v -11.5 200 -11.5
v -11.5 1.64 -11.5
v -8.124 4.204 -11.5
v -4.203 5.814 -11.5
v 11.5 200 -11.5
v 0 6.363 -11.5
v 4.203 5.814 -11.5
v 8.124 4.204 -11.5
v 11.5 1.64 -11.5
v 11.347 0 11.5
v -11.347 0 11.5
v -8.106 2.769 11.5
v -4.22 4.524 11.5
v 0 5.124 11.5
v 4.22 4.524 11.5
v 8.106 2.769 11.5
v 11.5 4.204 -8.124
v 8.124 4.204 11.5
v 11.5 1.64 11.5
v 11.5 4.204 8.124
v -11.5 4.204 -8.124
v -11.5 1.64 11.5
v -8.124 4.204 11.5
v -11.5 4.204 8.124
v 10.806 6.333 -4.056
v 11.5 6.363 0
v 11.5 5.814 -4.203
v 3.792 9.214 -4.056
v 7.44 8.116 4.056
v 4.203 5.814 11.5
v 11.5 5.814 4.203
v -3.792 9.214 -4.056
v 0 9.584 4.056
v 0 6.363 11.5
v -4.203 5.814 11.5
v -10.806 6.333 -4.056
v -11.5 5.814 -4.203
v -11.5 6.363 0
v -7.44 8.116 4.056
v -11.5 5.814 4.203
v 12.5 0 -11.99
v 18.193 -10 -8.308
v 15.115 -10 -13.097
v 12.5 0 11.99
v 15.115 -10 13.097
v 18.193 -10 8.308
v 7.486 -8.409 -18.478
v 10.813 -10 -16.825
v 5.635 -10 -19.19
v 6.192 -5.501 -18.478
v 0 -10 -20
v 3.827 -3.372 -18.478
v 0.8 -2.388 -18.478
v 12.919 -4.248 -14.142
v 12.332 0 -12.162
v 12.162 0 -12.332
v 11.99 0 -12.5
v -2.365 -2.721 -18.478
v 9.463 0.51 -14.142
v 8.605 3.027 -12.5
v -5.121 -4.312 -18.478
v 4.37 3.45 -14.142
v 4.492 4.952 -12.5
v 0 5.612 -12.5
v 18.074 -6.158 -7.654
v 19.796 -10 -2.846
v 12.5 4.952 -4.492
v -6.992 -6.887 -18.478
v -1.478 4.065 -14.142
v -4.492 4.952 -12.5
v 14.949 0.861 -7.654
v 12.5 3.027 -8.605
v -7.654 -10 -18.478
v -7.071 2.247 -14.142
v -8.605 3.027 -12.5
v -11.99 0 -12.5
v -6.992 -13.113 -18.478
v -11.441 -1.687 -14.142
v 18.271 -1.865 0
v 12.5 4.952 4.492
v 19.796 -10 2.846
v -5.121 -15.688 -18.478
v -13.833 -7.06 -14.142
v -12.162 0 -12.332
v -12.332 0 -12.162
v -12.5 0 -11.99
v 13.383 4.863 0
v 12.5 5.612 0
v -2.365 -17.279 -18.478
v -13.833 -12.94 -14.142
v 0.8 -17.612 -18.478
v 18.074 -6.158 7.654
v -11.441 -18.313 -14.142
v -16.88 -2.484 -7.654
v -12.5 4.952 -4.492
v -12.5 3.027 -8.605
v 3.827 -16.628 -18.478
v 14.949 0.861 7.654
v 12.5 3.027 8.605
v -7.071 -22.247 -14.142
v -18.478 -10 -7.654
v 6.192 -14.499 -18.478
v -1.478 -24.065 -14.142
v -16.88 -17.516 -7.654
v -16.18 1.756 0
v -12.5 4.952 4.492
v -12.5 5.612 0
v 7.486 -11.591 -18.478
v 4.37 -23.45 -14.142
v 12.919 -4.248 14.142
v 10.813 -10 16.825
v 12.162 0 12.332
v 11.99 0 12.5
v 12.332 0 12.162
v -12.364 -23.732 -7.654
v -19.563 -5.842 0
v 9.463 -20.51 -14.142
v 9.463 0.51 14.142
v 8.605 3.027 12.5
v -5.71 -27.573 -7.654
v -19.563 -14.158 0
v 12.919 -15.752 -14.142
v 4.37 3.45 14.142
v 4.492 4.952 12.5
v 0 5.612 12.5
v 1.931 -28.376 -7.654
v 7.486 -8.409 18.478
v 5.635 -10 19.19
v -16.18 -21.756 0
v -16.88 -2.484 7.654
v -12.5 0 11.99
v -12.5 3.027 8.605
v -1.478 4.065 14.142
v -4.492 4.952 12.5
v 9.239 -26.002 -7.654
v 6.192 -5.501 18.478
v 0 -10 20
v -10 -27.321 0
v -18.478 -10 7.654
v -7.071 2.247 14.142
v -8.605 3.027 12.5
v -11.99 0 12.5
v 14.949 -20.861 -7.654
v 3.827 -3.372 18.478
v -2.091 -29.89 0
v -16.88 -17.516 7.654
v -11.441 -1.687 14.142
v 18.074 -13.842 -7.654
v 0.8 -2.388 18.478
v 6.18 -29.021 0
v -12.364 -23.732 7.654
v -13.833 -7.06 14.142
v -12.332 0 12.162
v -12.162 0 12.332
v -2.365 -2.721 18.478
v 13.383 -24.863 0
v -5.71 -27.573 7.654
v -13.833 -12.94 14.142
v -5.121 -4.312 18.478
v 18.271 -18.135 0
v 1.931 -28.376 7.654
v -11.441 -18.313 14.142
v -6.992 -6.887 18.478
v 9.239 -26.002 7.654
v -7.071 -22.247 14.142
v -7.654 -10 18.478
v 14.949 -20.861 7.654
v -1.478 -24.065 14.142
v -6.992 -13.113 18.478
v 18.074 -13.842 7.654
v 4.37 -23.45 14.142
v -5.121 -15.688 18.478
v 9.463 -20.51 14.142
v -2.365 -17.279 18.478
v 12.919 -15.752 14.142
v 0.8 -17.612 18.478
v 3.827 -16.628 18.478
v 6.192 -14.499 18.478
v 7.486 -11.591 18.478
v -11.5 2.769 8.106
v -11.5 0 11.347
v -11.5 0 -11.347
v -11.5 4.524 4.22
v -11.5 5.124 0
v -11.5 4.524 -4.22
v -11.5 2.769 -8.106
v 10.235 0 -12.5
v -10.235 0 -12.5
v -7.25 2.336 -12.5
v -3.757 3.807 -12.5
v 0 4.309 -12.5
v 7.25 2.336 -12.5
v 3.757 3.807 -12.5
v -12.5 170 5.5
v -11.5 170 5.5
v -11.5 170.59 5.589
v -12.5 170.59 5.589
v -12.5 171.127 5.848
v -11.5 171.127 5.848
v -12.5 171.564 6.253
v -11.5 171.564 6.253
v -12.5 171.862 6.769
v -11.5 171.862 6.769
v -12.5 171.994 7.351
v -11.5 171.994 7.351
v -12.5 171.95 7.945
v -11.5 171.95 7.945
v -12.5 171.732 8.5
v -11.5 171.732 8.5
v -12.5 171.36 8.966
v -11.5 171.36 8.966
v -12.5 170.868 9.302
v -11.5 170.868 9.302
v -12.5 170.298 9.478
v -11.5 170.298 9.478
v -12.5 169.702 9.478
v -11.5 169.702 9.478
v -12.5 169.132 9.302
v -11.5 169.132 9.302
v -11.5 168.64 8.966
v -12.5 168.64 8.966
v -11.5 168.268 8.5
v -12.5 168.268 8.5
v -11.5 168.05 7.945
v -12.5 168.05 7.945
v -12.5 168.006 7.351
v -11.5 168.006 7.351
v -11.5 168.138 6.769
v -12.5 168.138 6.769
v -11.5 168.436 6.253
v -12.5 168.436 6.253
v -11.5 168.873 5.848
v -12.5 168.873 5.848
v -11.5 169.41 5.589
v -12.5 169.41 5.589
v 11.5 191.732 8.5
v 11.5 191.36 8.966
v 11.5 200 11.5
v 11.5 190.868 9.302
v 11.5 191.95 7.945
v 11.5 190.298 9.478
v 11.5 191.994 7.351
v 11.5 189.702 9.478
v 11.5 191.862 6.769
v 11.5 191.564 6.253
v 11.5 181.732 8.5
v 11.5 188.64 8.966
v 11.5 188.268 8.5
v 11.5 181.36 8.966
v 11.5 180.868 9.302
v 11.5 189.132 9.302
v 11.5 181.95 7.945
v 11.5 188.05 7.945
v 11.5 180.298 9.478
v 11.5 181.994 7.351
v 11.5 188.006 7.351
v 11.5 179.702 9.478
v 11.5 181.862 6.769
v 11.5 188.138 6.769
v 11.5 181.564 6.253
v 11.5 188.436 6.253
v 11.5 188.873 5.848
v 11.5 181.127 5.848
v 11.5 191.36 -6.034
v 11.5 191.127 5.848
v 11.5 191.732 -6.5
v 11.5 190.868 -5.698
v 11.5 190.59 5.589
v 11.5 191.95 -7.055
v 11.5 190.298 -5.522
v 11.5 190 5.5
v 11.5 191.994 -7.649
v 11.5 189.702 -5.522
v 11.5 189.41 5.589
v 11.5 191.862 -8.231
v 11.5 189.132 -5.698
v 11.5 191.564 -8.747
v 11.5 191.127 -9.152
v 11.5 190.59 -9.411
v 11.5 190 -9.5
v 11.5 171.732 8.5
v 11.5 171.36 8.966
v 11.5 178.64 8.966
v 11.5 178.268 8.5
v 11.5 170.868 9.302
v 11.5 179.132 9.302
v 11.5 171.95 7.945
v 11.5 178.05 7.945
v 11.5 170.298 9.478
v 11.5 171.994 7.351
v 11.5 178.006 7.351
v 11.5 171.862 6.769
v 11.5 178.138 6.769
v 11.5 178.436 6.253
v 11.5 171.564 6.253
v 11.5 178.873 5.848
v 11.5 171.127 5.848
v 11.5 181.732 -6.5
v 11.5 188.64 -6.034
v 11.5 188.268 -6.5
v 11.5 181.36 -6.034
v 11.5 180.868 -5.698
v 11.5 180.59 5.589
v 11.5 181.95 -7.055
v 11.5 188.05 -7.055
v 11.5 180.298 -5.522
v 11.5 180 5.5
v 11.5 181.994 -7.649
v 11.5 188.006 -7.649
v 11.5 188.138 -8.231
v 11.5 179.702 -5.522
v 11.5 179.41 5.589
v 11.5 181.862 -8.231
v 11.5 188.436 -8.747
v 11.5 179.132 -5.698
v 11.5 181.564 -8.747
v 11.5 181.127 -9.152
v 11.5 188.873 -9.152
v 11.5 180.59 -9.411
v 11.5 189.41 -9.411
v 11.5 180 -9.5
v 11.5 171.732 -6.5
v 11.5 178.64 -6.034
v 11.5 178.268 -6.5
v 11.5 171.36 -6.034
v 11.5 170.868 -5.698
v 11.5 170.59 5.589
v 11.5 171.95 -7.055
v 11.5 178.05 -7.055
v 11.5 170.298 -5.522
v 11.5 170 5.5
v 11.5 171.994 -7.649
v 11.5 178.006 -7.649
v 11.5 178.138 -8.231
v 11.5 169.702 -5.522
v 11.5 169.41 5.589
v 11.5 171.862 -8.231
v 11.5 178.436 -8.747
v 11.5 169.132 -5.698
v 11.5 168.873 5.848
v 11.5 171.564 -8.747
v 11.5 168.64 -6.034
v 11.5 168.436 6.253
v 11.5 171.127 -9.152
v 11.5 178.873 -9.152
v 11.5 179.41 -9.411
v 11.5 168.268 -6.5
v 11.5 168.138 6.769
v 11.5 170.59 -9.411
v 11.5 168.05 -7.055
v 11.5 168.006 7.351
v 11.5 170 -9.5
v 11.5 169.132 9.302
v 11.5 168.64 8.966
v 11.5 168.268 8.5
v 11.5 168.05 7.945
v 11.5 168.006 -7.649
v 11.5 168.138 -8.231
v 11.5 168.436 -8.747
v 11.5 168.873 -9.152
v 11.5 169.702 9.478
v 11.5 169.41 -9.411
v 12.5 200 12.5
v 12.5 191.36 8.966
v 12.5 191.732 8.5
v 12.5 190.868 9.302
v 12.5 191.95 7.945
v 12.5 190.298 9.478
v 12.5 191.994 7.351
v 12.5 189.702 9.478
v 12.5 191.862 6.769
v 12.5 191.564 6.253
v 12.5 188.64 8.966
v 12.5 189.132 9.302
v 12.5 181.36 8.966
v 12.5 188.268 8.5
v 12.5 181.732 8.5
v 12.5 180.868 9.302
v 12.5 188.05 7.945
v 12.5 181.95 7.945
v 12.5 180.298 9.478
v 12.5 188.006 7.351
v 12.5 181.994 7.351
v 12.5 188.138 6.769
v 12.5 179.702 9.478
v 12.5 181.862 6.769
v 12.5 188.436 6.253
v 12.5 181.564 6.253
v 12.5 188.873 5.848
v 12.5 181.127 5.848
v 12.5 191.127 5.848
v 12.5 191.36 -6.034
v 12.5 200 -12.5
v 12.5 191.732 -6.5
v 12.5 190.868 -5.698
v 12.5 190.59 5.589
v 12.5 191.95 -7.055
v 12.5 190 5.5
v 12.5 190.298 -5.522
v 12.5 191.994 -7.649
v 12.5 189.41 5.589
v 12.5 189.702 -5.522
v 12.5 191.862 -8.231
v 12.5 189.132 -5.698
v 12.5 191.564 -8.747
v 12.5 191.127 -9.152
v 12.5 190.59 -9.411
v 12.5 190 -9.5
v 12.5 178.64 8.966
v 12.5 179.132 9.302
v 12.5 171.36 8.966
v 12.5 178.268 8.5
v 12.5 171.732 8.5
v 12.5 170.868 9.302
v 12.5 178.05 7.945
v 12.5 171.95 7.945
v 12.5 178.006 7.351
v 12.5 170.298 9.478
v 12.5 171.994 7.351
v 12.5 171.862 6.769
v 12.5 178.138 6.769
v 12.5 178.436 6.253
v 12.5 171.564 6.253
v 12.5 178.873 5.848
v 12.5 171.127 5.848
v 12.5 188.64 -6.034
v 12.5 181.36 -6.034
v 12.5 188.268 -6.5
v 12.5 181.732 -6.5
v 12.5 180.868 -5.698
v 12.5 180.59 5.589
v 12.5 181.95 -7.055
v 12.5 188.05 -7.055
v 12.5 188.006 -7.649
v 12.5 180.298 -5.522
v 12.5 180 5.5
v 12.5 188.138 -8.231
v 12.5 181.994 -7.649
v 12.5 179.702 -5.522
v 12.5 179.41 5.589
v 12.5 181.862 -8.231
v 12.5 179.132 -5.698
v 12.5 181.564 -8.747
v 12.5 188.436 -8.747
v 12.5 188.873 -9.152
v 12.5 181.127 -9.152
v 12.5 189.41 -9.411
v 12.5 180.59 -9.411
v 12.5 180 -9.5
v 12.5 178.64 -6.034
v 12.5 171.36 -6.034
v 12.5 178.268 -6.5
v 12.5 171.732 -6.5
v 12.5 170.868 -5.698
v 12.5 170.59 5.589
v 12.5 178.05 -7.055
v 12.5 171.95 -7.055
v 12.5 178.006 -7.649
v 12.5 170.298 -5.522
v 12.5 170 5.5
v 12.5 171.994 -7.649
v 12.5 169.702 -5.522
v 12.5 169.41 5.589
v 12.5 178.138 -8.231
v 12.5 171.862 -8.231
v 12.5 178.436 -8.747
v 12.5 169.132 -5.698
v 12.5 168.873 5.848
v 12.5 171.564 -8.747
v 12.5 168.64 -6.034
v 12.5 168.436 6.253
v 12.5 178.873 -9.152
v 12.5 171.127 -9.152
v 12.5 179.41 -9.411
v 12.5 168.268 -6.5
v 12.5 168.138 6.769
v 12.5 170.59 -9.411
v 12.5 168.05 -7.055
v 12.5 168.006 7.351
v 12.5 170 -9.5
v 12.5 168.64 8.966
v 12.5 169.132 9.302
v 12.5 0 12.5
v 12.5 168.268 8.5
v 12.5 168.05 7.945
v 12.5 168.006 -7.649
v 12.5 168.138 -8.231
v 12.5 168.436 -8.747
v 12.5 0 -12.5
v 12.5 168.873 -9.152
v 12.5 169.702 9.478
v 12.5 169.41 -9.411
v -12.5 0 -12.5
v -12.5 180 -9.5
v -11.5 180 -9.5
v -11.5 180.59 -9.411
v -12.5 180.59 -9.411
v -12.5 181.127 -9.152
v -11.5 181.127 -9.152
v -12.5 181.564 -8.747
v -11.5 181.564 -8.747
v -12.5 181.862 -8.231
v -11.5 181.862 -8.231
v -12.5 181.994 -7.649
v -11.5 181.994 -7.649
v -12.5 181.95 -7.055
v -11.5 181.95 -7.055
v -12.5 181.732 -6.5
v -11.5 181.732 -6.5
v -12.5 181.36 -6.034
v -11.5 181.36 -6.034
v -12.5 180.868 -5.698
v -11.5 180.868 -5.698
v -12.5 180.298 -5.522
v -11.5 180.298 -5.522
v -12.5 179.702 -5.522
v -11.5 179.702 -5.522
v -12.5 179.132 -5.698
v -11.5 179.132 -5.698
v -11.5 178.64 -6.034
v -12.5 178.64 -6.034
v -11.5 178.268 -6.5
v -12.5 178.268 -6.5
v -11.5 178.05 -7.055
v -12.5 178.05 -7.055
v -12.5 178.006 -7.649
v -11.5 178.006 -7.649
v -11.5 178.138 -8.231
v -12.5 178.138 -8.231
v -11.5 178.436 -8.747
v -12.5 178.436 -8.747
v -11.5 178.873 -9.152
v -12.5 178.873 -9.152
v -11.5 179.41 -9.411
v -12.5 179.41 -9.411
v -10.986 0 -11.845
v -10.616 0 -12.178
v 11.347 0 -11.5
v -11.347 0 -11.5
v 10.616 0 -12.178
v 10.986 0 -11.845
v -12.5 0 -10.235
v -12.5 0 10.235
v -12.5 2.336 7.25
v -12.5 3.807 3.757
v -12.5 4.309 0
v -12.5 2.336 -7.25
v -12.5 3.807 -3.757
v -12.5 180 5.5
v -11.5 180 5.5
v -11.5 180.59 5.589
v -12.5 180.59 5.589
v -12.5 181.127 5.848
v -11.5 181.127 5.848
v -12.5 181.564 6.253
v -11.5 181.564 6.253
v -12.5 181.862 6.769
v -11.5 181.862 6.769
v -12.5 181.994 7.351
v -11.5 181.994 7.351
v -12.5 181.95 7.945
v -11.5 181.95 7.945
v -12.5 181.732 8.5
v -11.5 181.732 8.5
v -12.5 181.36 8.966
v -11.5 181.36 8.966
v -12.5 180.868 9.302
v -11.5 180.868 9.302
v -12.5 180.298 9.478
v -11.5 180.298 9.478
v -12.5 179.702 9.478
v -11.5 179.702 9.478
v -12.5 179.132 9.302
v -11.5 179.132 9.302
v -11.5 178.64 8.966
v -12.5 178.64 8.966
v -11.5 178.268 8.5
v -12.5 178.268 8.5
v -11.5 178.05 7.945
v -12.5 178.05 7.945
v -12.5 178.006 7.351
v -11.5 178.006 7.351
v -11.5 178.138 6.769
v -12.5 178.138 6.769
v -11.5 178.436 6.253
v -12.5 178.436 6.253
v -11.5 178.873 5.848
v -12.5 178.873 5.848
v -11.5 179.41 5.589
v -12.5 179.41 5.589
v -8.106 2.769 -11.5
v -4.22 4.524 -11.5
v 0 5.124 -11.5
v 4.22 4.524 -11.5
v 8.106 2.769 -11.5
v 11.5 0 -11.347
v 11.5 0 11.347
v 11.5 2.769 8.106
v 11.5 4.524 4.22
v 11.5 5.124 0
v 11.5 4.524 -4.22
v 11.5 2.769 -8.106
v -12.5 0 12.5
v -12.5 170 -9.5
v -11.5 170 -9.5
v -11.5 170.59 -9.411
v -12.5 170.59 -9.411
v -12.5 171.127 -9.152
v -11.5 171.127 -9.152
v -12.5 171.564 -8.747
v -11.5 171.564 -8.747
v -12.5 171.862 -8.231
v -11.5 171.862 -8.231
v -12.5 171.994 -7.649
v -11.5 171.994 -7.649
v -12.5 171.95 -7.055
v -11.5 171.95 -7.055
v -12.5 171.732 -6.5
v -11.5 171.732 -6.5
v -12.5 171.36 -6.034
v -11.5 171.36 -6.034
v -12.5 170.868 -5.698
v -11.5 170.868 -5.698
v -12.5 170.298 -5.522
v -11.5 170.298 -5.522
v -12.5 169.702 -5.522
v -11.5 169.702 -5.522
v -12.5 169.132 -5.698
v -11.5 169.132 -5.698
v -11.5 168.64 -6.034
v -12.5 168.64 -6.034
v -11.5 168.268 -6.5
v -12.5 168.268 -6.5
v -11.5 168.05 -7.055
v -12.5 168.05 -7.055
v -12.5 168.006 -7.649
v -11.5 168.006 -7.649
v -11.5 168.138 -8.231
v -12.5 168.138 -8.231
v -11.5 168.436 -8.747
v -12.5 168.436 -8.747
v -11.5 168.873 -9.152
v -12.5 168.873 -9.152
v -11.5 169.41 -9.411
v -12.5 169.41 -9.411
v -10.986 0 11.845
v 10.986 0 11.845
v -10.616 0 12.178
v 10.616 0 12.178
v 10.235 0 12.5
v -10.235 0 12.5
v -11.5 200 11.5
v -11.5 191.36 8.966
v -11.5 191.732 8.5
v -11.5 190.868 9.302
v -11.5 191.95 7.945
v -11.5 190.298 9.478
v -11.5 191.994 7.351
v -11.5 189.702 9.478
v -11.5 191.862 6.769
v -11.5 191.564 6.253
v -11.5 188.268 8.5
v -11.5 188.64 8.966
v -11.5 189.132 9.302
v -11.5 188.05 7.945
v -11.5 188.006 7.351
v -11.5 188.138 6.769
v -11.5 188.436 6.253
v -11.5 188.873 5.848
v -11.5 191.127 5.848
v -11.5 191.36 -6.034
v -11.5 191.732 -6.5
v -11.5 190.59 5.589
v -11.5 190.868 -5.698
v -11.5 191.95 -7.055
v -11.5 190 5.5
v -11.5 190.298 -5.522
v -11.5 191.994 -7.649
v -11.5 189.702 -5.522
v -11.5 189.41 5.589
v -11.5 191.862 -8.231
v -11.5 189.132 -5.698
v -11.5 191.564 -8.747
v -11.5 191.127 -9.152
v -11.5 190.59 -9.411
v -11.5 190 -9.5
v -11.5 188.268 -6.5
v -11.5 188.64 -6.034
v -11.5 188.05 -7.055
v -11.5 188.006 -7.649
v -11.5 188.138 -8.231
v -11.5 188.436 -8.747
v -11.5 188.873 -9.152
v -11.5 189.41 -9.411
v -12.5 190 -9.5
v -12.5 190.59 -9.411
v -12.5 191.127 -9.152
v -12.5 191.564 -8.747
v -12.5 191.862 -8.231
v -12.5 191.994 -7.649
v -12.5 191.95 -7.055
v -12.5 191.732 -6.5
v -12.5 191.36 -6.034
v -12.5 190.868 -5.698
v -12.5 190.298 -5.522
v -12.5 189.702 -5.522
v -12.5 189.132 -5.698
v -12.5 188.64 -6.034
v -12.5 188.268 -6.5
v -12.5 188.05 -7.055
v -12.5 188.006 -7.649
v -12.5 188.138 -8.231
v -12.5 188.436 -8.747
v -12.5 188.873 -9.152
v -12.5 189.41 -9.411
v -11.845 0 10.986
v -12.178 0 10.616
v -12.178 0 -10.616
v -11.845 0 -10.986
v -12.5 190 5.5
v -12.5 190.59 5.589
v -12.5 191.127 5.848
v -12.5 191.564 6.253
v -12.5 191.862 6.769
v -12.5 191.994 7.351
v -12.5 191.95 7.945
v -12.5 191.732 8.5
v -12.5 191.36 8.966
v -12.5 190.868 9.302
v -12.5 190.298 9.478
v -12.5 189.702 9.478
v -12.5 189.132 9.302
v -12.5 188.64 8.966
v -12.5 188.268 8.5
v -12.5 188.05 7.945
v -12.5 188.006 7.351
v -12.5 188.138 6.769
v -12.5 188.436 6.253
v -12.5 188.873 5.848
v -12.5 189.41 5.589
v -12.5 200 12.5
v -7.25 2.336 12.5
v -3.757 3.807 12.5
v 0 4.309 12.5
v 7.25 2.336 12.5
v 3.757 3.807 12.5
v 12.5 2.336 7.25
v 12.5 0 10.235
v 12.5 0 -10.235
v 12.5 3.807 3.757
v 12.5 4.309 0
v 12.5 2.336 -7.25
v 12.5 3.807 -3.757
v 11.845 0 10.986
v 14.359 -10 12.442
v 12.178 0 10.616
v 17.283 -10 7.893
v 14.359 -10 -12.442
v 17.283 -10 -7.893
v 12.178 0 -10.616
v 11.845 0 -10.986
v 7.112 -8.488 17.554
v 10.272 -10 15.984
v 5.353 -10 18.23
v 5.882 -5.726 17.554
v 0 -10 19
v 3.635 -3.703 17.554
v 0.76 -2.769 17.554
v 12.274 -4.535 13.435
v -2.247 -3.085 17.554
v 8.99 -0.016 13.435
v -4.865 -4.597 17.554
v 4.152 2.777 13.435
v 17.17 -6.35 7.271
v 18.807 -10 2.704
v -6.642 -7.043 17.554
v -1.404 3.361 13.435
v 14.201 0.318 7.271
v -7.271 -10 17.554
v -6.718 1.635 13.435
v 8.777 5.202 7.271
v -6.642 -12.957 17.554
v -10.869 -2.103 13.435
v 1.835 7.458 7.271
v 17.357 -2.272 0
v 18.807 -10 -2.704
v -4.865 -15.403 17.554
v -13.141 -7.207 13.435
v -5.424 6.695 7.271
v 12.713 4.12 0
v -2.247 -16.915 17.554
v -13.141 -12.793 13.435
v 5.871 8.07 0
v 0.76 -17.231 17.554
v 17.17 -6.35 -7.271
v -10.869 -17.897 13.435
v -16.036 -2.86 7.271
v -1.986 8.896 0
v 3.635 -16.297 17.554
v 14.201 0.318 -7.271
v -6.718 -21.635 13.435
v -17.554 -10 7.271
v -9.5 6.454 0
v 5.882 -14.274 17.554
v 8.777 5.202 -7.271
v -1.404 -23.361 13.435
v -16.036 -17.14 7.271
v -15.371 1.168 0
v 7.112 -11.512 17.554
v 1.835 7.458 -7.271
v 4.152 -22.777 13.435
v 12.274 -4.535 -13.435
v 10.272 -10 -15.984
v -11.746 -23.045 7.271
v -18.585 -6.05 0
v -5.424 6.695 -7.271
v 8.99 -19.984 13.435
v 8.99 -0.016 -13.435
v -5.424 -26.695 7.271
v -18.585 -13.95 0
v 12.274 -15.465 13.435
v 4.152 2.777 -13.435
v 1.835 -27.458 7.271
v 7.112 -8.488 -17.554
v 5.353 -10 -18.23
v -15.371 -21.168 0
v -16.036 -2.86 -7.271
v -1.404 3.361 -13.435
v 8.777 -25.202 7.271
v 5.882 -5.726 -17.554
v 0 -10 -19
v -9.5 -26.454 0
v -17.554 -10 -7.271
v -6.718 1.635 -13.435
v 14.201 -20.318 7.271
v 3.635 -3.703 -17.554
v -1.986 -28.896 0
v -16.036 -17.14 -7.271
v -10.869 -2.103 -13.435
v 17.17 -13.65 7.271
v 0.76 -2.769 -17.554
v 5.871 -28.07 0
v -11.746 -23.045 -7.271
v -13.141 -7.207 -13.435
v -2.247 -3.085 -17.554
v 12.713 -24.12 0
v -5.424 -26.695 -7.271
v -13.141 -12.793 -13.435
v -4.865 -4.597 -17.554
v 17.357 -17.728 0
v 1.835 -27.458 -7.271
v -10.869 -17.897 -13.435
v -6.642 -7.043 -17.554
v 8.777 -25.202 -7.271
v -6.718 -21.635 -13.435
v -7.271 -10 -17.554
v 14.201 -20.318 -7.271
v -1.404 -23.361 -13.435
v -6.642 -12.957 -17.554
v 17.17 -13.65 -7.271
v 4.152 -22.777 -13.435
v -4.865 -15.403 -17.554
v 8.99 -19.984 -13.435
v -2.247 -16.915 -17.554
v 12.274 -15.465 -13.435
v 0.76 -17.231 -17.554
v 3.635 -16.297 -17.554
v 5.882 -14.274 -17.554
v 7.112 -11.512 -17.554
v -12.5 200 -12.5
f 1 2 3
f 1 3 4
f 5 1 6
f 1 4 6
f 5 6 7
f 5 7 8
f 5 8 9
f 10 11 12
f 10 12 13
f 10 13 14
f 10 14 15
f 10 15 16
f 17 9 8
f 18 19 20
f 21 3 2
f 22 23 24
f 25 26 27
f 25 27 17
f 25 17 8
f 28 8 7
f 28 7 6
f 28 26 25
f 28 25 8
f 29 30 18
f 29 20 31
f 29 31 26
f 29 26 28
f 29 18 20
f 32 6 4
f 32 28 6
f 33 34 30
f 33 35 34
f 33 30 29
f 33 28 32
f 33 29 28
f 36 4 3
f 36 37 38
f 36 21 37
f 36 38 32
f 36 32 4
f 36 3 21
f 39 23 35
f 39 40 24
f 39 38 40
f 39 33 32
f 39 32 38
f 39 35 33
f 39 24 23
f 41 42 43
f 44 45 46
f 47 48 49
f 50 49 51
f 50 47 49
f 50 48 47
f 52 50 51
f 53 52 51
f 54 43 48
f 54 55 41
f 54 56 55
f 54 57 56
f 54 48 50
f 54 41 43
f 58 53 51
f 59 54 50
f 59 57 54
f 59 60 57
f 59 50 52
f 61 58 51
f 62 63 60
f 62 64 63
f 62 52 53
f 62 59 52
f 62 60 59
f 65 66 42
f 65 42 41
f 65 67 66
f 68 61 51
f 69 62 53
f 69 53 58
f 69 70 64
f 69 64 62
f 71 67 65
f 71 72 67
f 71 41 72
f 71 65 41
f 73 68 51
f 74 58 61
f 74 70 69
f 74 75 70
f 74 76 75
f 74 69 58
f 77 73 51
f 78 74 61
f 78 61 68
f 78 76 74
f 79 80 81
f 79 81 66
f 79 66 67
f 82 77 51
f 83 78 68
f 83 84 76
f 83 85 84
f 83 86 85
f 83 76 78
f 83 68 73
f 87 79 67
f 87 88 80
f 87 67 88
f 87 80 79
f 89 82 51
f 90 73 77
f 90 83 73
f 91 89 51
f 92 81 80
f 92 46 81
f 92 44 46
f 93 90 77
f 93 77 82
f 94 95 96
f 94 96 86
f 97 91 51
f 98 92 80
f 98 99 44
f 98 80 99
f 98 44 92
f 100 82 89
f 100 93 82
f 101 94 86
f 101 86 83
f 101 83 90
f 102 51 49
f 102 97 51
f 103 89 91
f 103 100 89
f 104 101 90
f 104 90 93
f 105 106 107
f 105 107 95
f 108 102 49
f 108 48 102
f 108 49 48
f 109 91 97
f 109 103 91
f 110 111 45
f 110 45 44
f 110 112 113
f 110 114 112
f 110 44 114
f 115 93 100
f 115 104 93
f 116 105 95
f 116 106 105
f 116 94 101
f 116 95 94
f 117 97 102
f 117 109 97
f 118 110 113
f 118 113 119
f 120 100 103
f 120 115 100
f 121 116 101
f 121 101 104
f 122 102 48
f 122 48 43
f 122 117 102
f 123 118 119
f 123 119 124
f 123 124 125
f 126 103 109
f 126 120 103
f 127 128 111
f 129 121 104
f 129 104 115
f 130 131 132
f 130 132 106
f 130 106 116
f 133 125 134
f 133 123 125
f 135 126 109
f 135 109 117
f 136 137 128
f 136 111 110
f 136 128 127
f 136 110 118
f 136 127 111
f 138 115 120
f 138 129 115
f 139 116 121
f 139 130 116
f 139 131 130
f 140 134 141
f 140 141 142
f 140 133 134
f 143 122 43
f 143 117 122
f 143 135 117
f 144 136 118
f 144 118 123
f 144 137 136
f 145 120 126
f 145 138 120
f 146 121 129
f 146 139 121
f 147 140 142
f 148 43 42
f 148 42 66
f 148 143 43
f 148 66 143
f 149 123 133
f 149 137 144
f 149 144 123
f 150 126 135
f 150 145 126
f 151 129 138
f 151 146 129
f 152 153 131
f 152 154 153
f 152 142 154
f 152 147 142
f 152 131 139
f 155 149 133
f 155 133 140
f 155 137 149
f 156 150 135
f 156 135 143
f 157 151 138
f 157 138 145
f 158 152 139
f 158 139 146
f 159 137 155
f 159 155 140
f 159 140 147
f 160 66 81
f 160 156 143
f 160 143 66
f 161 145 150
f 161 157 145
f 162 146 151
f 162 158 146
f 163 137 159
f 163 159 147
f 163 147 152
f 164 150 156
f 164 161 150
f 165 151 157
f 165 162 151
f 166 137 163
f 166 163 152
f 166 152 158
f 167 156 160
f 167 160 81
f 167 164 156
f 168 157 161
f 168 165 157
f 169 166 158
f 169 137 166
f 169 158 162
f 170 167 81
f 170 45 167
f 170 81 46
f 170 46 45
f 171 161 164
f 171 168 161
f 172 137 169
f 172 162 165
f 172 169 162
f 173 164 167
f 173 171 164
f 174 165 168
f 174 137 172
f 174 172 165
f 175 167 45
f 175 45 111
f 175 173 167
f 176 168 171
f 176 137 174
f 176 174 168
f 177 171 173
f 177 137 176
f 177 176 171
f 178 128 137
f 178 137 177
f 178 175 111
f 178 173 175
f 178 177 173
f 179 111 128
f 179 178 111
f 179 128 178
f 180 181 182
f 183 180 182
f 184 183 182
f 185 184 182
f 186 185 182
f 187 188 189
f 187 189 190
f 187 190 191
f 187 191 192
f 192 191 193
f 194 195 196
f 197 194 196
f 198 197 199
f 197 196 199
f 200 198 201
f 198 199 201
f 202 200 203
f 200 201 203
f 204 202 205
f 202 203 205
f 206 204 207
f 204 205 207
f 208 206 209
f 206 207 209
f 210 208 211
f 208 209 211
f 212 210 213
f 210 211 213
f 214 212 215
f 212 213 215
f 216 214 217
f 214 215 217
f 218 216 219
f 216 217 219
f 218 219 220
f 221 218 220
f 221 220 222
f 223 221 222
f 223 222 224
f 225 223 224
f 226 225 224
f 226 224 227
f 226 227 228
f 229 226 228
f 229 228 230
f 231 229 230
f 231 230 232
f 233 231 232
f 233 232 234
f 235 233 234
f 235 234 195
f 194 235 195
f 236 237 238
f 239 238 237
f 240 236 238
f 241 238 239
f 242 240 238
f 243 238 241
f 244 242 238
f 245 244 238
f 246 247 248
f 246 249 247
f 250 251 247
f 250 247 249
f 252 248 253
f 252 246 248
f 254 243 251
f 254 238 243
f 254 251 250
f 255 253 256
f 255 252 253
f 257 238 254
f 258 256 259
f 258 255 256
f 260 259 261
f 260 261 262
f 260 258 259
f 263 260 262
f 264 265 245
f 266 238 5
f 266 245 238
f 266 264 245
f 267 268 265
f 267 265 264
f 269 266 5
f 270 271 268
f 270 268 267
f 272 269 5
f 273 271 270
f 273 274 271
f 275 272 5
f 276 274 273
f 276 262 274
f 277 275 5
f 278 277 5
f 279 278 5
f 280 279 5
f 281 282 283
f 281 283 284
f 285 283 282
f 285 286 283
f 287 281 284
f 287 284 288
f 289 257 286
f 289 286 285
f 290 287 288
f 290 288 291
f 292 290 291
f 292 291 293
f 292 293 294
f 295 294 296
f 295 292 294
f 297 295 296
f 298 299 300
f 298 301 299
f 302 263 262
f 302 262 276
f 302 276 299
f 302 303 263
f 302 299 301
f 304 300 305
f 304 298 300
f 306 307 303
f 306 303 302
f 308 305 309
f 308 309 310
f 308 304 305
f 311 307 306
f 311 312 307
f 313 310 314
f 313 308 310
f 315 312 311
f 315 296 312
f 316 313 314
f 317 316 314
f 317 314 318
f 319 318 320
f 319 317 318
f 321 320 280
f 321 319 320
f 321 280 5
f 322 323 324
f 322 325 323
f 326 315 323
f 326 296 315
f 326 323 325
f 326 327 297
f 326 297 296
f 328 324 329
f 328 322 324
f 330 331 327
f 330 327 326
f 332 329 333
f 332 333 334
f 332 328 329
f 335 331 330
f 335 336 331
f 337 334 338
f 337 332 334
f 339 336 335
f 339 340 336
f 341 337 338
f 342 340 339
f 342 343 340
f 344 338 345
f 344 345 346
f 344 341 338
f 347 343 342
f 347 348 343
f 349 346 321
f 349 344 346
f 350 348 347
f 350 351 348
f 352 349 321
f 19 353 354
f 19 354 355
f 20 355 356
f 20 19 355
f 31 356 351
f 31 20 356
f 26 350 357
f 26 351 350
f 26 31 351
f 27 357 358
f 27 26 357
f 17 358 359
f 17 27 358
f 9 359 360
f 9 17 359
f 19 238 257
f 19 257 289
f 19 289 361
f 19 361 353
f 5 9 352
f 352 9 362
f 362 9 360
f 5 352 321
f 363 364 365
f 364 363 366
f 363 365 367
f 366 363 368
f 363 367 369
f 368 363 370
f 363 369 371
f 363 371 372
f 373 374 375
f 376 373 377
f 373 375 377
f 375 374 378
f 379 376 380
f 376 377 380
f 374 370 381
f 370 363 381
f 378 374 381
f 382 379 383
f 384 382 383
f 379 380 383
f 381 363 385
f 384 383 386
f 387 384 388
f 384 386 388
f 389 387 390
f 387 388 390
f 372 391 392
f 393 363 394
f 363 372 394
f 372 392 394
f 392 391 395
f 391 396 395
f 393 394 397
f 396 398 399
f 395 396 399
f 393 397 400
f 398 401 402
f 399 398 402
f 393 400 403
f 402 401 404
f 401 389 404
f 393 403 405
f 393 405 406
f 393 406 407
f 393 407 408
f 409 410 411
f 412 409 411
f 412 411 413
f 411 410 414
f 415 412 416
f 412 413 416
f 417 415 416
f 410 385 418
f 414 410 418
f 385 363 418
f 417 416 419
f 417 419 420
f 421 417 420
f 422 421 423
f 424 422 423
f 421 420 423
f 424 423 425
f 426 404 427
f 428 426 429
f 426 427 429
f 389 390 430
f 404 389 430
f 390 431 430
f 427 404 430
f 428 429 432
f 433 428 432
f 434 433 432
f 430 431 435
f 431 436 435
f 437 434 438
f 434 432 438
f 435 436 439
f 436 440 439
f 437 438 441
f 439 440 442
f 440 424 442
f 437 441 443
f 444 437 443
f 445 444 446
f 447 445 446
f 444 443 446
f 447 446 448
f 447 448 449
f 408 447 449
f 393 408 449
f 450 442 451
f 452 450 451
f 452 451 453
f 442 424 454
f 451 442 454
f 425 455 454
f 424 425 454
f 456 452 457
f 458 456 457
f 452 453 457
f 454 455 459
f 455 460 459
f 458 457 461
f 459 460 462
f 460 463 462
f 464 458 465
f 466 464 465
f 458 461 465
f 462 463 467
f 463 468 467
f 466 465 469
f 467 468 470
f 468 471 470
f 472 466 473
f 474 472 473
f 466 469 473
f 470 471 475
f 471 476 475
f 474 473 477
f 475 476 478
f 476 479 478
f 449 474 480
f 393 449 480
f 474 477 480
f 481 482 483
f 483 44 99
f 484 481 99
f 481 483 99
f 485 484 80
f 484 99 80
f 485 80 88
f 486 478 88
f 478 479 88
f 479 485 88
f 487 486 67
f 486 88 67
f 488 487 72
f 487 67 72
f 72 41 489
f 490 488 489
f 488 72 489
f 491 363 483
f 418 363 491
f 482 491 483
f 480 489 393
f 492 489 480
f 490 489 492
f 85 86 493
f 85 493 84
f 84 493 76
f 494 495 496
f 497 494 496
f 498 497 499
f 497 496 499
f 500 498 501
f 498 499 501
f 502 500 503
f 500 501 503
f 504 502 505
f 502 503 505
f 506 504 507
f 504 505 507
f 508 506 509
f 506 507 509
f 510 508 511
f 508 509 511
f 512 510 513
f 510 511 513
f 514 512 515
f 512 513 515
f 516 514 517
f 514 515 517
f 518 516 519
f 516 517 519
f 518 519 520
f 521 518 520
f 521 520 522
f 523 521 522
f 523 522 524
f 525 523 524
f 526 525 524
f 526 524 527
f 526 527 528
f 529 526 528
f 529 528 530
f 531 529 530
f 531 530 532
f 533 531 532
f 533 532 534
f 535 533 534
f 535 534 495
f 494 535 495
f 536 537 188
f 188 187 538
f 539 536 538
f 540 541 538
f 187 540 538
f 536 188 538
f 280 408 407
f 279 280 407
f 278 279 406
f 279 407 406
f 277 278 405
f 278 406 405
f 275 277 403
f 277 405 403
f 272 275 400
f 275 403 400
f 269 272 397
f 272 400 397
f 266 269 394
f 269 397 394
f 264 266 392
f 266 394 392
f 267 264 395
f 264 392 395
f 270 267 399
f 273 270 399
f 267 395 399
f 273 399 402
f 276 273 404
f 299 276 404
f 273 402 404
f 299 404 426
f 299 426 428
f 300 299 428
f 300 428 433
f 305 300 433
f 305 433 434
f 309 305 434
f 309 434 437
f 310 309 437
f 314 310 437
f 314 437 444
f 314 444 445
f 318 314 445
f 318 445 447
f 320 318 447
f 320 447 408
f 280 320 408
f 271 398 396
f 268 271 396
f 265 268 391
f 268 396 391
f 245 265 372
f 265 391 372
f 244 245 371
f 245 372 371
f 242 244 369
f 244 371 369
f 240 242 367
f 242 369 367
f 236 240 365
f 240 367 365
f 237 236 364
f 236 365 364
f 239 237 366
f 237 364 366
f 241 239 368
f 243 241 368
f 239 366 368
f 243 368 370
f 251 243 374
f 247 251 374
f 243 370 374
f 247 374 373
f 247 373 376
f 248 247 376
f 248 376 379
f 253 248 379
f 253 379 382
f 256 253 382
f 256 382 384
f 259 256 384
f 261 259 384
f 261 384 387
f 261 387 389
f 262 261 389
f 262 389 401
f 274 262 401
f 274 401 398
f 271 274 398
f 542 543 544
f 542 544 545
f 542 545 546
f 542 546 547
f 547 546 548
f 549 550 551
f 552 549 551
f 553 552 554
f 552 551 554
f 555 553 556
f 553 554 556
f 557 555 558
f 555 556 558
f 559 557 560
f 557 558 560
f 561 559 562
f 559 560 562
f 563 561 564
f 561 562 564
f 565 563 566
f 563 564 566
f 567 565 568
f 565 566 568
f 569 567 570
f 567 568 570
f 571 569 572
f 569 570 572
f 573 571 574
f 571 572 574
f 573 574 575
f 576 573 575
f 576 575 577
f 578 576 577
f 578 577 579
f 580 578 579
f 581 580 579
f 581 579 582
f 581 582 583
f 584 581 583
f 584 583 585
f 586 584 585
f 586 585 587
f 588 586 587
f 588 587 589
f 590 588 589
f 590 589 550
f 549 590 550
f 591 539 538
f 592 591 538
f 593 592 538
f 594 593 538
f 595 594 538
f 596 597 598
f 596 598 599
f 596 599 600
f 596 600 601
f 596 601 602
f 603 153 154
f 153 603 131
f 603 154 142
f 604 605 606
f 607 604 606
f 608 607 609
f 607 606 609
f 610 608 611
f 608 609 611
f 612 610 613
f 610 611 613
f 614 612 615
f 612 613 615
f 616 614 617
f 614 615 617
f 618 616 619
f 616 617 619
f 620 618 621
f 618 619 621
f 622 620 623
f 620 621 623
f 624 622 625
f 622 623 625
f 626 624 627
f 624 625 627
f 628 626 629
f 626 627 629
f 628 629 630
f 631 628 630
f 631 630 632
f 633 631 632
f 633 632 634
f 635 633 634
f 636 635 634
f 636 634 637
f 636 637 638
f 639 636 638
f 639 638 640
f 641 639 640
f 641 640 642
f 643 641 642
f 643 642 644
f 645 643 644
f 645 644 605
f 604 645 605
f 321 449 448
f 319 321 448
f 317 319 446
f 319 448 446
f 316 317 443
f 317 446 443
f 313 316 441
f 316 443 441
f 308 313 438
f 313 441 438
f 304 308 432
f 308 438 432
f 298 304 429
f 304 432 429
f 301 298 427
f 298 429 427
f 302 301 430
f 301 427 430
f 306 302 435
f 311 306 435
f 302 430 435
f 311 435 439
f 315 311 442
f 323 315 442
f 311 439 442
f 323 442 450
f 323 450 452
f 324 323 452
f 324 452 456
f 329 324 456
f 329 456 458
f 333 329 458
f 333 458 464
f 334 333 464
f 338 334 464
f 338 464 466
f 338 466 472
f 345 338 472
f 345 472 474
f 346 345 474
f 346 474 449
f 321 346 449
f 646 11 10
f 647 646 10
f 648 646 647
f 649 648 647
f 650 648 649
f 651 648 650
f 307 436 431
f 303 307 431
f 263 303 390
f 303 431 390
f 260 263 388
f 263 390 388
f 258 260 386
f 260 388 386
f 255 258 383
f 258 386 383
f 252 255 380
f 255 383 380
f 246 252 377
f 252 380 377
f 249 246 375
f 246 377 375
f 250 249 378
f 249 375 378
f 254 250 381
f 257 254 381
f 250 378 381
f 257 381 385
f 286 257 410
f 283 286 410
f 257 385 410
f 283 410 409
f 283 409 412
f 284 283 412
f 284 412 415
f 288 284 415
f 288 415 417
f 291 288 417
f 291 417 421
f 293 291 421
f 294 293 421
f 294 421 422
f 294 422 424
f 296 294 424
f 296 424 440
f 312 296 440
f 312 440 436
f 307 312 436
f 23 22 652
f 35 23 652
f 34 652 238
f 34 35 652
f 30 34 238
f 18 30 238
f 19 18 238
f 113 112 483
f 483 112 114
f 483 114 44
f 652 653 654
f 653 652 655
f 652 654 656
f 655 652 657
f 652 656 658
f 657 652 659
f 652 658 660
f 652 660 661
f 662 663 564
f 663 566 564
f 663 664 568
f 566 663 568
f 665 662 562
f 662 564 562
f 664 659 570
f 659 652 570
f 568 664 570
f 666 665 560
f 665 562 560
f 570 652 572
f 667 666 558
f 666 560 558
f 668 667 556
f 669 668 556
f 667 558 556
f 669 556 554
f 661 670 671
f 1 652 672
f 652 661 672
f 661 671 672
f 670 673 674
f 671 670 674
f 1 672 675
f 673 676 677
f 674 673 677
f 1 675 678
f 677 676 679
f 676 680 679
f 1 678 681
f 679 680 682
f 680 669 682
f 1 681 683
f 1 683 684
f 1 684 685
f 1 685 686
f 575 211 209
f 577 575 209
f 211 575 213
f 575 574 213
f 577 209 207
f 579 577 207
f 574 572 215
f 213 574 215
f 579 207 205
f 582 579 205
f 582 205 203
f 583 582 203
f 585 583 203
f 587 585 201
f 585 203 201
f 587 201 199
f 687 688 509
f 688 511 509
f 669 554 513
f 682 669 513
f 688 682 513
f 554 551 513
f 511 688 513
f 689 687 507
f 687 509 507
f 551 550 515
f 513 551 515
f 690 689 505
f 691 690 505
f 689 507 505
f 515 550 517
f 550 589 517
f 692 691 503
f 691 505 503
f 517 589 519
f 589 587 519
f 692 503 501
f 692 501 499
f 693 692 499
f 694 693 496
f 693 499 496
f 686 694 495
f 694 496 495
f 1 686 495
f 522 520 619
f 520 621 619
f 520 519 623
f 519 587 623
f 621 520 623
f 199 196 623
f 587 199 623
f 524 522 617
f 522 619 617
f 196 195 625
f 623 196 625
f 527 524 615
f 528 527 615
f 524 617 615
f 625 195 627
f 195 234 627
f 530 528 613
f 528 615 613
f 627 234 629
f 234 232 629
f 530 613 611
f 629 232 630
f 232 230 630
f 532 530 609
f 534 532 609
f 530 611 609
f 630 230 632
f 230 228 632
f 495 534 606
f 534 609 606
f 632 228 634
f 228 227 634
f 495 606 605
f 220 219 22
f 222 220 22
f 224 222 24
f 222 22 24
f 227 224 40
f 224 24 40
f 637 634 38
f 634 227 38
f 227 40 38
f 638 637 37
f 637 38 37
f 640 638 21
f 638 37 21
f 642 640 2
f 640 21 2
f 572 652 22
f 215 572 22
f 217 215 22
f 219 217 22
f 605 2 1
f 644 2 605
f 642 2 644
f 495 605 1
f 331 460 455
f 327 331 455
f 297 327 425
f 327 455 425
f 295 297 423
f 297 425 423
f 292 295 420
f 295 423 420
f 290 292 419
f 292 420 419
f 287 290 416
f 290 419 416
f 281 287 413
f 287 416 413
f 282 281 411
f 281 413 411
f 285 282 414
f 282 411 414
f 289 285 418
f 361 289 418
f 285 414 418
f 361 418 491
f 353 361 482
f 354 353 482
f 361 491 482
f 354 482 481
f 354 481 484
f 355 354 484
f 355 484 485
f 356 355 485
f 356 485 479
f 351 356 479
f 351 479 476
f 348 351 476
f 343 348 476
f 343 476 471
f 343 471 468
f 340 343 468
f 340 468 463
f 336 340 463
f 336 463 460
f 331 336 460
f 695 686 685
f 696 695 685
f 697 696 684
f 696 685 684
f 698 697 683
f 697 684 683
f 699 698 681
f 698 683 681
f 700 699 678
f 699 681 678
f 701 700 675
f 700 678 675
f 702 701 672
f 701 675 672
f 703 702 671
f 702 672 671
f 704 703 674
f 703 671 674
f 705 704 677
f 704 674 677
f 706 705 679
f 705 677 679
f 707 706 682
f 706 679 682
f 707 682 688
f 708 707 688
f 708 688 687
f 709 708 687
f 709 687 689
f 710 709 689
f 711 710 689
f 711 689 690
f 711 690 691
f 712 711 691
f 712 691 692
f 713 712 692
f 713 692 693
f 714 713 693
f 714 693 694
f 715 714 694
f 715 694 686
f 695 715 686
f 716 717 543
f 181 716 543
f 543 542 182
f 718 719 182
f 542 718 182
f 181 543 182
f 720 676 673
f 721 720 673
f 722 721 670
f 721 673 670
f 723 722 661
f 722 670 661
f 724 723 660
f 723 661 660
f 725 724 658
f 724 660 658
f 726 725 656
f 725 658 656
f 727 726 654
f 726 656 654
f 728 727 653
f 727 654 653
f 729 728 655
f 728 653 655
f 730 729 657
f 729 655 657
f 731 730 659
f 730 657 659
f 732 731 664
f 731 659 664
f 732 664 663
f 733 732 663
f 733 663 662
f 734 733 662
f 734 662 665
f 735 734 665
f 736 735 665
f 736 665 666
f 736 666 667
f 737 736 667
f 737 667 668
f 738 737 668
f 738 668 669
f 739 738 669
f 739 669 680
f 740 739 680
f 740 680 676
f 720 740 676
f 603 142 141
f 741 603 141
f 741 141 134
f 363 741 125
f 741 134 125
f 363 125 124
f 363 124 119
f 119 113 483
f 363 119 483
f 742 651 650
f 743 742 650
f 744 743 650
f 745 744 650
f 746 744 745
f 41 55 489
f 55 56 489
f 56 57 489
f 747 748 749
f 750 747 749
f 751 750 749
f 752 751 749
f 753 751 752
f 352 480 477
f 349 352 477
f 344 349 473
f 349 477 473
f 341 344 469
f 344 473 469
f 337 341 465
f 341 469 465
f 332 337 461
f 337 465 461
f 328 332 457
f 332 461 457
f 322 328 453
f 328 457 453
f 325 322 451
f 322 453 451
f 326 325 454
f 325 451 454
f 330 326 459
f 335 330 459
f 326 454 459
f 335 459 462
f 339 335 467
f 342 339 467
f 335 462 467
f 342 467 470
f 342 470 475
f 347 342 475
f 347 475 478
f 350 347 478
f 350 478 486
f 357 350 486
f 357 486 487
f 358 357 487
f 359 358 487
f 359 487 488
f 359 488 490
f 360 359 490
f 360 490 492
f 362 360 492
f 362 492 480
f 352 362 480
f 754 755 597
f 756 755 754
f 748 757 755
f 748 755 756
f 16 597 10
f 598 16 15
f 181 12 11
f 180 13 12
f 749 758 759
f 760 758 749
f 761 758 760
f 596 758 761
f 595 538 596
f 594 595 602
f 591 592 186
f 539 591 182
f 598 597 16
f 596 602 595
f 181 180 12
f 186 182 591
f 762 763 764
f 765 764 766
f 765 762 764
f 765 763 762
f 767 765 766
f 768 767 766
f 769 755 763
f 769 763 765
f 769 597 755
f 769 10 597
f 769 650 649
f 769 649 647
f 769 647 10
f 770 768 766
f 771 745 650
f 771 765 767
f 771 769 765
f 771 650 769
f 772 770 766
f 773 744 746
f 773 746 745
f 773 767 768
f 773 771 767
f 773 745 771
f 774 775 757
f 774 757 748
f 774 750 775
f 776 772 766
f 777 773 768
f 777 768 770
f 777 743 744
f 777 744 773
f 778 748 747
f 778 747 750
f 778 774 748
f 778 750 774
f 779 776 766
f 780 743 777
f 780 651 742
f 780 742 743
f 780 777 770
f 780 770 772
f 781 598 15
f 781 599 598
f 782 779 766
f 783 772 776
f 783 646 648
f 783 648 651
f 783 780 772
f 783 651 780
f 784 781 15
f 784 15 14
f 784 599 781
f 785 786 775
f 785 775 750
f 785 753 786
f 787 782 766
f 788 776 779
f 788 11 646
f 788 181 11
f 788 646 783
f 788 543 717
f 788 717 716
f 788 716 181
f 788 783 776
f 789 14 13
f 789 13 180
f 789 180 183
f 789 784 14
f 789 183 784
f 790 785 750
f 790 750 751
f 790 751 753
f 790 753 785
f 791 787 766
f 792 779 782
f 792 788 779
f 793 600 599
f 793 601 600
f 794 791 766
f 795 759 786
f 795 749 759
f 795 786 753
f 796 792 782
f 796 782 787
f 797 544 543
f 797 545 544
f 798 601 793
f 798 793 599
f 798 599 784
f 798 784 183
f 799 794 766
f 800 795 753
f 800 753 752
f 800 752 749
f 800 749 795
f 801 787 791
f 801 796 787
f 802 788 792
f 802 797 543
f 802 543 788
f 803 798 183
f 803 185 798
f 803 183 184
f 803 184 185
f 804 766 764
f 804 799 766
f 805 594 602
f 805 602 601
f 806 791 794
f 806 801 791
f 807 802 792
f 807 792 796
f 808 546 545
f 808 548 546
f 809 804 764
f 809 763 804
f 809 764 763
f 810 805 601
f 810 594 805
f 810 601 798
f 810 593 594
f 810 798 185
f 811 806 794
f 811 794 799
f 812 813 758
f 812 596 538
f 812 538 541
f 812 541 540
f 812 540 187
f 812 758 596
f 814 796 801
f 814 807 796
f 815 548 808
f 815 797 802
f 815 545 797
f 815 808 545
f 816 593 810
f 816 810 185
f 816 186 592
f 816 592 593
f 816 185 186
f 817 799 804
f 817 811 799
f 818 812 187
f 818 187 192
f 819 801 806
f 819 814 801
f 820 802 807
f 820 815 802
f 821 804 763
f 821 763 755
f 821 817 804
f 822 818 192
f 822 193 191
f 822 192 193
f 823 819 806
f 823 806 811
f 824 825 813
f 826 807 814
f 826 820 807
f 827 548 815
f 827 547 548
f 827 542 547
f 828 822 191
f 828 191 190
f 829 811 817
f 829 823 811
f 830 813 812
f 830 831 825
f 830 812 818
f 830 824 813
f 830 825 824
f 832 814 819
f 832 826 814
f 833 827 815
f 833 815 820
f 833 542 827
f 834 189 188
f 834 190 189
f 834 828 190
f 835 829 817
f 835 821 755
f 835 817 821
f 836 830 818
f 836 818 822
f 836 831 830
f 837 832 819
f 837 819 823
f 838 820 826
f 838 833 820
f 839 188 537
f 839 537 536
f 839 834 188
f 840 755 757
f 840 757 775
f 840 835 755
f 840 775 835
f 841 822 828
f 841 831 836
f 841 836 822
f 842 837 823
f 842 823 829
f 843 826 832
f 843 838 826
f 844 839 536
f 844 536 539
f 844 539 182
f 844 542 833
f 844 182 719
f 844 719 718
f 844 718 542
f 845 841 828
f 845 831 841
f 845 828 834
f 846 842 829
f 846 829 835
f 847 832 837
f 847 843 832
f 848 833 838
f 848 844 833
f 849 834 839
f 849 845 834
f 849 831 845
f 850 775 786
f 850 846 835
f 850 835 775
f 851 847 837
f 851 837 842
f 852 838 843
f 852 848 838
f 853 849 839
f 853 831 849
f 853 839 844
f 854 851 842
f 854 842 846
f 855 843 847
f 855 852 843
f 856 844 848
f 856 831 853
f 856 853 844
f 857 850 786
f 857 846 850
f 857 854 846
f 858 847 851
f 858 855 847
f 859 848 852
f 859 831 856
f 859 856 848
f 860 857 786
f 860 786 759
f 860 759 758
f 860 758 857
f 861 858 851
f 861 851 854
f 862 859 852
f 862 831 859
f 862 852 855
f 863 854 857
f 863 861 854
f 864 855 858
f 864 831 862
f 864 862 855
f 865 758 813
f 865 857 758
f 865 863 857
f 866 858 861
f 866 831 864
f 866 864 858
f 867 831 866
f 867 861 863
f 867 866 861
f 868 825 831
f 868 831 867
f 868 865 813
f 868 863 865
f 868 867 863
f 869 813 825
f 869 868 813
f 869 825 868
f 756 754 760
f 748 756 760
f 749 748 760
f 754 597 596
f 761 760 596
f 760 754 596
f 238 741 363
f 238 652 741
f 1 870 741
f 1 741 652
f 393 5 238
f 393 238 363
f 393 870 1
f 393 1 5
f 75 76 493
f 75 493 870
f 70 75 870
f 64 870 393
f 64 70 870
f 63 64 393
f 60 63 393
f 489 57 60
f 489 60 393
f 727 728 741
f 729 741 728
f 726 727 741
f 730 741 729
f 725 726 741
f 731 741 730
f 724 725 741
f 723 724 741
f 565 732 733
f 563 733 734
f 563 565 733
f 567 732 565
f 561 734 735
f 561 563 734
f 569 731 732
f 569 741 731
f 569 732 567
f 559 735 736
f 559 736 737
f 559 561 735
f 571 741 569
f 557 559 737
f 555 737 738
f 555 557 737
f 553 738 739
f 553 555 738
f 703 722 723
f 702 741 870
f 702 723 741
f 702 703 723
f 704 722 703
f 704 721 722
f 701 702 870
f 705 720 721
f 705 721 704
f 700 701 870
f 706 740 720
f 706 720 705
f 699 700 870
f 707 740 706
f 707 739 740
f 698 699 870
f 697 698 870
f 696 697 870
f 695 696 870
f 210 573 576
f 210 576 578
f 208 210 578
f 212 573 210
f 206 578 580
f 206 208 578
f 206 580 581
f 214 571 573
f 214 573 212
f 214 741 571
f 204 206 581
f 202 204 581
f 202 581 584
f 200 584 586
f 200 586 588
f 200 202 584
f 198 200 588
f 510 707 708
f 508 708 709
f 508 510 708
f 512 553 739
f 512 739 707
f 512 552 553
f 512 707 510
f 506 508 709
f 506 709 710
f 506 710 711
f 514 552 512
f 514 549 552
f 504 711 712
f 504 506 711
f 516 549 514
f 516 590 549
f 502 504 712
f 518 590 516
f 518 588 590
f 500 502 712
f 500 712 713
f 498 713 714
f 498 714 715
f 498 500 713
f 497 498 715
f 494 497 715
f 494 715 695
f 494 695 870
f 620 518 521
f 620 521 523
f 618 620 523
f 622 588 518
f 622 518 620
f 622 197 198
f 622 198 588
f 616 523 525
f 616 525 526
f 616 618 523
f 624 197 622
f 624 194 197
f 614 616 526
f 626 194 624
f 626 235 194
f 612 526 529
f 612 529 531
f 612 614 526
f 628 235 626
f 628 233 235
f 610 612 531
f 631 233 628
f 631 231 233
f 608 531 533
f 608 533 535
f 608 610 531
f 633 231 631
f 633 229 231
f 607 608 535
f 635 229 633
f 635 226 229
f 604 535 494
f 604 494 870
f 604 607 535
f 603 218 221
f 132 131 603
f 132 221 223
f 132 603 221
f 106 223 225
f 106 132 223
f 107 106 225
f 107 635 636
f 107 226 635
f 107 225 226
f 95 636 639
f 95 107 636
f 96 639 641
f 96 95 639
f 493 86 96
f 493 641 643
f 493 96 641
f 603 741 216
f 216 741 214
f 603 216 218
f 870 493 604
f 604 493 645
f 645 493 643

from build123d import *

# Parameters (mm, degrees)
SKETCH1_W           = 25
SKETCH1_H           = 25
SKETCH1_W_2         = 23
SKETCH1_H_2         = 23
BOSS_EXTRUDE1_DEPTH = 200
SKETCH3_R           = 2
CUT_EXTRUDE1_DEPTH  = 25


with BuildPart() as part:
    # Sketch1 → Boss-Extrude1 (new body)
    with BuildSketch(Plane(origin=(0, 0, 0), x_dir=(1, 0, 0), z_dir=(0, 1, 0))):
        Rectangle(SKETCH1_W, SKETCH1_H)
        Rectangle(SKETCH1_W_2, SKETCH1_H_2, mode=Mode.SUBTRACT)
    extrude(amount=BOSS_EXTRUDE1_DEPTH)

    # Sketch2 → Revolve1 (revolve)
    with BuildSketch(Plane(origin=(0, -10, 0), x_dir=(-1, 0, 0), z_dir=(0, -1, 0))):
        with BuildLine():
            Line((0, 19), (0, 20))
            ThreePointArc((0, 20), (-20, 0), (0, -20))
            Line((0, -20), (0, -19))
            ThreePointArc((0, -19), (-19, 0), (0, 19))
        make_face()
    revolve(axis=Axis((0, -10, -20), (0, 0, 1)))

    # Sketch3 → Cut-Extrude1 (cut)
    with BuildSketch(Plane(origin=(12.5, 0, 0), x_dir=(0, 0, -1), z_dir=(1, 0, 0))):
        with Locations((7.5, 190)):
            Circle(SKETCH3_R)
        with Locations((7.5, 180)):
            Circle(SKETCH3_R)
        with Locations((-7.5, 190)):
            Circle(SKETCH3_R)
        with Locations((-7.5, 180)):
            Circle(SKETCH3_R)
        with Locations((7.5, 170)):
            Circle(SKETCH3_R)
        with Locations((-7.5, 170)):
            Circle(SKETCH3_R)
    extrude(amount=-CUT_EXTRUDE1_DEPTH, mode=Mode.SUBTRACT)


solid = part.part
